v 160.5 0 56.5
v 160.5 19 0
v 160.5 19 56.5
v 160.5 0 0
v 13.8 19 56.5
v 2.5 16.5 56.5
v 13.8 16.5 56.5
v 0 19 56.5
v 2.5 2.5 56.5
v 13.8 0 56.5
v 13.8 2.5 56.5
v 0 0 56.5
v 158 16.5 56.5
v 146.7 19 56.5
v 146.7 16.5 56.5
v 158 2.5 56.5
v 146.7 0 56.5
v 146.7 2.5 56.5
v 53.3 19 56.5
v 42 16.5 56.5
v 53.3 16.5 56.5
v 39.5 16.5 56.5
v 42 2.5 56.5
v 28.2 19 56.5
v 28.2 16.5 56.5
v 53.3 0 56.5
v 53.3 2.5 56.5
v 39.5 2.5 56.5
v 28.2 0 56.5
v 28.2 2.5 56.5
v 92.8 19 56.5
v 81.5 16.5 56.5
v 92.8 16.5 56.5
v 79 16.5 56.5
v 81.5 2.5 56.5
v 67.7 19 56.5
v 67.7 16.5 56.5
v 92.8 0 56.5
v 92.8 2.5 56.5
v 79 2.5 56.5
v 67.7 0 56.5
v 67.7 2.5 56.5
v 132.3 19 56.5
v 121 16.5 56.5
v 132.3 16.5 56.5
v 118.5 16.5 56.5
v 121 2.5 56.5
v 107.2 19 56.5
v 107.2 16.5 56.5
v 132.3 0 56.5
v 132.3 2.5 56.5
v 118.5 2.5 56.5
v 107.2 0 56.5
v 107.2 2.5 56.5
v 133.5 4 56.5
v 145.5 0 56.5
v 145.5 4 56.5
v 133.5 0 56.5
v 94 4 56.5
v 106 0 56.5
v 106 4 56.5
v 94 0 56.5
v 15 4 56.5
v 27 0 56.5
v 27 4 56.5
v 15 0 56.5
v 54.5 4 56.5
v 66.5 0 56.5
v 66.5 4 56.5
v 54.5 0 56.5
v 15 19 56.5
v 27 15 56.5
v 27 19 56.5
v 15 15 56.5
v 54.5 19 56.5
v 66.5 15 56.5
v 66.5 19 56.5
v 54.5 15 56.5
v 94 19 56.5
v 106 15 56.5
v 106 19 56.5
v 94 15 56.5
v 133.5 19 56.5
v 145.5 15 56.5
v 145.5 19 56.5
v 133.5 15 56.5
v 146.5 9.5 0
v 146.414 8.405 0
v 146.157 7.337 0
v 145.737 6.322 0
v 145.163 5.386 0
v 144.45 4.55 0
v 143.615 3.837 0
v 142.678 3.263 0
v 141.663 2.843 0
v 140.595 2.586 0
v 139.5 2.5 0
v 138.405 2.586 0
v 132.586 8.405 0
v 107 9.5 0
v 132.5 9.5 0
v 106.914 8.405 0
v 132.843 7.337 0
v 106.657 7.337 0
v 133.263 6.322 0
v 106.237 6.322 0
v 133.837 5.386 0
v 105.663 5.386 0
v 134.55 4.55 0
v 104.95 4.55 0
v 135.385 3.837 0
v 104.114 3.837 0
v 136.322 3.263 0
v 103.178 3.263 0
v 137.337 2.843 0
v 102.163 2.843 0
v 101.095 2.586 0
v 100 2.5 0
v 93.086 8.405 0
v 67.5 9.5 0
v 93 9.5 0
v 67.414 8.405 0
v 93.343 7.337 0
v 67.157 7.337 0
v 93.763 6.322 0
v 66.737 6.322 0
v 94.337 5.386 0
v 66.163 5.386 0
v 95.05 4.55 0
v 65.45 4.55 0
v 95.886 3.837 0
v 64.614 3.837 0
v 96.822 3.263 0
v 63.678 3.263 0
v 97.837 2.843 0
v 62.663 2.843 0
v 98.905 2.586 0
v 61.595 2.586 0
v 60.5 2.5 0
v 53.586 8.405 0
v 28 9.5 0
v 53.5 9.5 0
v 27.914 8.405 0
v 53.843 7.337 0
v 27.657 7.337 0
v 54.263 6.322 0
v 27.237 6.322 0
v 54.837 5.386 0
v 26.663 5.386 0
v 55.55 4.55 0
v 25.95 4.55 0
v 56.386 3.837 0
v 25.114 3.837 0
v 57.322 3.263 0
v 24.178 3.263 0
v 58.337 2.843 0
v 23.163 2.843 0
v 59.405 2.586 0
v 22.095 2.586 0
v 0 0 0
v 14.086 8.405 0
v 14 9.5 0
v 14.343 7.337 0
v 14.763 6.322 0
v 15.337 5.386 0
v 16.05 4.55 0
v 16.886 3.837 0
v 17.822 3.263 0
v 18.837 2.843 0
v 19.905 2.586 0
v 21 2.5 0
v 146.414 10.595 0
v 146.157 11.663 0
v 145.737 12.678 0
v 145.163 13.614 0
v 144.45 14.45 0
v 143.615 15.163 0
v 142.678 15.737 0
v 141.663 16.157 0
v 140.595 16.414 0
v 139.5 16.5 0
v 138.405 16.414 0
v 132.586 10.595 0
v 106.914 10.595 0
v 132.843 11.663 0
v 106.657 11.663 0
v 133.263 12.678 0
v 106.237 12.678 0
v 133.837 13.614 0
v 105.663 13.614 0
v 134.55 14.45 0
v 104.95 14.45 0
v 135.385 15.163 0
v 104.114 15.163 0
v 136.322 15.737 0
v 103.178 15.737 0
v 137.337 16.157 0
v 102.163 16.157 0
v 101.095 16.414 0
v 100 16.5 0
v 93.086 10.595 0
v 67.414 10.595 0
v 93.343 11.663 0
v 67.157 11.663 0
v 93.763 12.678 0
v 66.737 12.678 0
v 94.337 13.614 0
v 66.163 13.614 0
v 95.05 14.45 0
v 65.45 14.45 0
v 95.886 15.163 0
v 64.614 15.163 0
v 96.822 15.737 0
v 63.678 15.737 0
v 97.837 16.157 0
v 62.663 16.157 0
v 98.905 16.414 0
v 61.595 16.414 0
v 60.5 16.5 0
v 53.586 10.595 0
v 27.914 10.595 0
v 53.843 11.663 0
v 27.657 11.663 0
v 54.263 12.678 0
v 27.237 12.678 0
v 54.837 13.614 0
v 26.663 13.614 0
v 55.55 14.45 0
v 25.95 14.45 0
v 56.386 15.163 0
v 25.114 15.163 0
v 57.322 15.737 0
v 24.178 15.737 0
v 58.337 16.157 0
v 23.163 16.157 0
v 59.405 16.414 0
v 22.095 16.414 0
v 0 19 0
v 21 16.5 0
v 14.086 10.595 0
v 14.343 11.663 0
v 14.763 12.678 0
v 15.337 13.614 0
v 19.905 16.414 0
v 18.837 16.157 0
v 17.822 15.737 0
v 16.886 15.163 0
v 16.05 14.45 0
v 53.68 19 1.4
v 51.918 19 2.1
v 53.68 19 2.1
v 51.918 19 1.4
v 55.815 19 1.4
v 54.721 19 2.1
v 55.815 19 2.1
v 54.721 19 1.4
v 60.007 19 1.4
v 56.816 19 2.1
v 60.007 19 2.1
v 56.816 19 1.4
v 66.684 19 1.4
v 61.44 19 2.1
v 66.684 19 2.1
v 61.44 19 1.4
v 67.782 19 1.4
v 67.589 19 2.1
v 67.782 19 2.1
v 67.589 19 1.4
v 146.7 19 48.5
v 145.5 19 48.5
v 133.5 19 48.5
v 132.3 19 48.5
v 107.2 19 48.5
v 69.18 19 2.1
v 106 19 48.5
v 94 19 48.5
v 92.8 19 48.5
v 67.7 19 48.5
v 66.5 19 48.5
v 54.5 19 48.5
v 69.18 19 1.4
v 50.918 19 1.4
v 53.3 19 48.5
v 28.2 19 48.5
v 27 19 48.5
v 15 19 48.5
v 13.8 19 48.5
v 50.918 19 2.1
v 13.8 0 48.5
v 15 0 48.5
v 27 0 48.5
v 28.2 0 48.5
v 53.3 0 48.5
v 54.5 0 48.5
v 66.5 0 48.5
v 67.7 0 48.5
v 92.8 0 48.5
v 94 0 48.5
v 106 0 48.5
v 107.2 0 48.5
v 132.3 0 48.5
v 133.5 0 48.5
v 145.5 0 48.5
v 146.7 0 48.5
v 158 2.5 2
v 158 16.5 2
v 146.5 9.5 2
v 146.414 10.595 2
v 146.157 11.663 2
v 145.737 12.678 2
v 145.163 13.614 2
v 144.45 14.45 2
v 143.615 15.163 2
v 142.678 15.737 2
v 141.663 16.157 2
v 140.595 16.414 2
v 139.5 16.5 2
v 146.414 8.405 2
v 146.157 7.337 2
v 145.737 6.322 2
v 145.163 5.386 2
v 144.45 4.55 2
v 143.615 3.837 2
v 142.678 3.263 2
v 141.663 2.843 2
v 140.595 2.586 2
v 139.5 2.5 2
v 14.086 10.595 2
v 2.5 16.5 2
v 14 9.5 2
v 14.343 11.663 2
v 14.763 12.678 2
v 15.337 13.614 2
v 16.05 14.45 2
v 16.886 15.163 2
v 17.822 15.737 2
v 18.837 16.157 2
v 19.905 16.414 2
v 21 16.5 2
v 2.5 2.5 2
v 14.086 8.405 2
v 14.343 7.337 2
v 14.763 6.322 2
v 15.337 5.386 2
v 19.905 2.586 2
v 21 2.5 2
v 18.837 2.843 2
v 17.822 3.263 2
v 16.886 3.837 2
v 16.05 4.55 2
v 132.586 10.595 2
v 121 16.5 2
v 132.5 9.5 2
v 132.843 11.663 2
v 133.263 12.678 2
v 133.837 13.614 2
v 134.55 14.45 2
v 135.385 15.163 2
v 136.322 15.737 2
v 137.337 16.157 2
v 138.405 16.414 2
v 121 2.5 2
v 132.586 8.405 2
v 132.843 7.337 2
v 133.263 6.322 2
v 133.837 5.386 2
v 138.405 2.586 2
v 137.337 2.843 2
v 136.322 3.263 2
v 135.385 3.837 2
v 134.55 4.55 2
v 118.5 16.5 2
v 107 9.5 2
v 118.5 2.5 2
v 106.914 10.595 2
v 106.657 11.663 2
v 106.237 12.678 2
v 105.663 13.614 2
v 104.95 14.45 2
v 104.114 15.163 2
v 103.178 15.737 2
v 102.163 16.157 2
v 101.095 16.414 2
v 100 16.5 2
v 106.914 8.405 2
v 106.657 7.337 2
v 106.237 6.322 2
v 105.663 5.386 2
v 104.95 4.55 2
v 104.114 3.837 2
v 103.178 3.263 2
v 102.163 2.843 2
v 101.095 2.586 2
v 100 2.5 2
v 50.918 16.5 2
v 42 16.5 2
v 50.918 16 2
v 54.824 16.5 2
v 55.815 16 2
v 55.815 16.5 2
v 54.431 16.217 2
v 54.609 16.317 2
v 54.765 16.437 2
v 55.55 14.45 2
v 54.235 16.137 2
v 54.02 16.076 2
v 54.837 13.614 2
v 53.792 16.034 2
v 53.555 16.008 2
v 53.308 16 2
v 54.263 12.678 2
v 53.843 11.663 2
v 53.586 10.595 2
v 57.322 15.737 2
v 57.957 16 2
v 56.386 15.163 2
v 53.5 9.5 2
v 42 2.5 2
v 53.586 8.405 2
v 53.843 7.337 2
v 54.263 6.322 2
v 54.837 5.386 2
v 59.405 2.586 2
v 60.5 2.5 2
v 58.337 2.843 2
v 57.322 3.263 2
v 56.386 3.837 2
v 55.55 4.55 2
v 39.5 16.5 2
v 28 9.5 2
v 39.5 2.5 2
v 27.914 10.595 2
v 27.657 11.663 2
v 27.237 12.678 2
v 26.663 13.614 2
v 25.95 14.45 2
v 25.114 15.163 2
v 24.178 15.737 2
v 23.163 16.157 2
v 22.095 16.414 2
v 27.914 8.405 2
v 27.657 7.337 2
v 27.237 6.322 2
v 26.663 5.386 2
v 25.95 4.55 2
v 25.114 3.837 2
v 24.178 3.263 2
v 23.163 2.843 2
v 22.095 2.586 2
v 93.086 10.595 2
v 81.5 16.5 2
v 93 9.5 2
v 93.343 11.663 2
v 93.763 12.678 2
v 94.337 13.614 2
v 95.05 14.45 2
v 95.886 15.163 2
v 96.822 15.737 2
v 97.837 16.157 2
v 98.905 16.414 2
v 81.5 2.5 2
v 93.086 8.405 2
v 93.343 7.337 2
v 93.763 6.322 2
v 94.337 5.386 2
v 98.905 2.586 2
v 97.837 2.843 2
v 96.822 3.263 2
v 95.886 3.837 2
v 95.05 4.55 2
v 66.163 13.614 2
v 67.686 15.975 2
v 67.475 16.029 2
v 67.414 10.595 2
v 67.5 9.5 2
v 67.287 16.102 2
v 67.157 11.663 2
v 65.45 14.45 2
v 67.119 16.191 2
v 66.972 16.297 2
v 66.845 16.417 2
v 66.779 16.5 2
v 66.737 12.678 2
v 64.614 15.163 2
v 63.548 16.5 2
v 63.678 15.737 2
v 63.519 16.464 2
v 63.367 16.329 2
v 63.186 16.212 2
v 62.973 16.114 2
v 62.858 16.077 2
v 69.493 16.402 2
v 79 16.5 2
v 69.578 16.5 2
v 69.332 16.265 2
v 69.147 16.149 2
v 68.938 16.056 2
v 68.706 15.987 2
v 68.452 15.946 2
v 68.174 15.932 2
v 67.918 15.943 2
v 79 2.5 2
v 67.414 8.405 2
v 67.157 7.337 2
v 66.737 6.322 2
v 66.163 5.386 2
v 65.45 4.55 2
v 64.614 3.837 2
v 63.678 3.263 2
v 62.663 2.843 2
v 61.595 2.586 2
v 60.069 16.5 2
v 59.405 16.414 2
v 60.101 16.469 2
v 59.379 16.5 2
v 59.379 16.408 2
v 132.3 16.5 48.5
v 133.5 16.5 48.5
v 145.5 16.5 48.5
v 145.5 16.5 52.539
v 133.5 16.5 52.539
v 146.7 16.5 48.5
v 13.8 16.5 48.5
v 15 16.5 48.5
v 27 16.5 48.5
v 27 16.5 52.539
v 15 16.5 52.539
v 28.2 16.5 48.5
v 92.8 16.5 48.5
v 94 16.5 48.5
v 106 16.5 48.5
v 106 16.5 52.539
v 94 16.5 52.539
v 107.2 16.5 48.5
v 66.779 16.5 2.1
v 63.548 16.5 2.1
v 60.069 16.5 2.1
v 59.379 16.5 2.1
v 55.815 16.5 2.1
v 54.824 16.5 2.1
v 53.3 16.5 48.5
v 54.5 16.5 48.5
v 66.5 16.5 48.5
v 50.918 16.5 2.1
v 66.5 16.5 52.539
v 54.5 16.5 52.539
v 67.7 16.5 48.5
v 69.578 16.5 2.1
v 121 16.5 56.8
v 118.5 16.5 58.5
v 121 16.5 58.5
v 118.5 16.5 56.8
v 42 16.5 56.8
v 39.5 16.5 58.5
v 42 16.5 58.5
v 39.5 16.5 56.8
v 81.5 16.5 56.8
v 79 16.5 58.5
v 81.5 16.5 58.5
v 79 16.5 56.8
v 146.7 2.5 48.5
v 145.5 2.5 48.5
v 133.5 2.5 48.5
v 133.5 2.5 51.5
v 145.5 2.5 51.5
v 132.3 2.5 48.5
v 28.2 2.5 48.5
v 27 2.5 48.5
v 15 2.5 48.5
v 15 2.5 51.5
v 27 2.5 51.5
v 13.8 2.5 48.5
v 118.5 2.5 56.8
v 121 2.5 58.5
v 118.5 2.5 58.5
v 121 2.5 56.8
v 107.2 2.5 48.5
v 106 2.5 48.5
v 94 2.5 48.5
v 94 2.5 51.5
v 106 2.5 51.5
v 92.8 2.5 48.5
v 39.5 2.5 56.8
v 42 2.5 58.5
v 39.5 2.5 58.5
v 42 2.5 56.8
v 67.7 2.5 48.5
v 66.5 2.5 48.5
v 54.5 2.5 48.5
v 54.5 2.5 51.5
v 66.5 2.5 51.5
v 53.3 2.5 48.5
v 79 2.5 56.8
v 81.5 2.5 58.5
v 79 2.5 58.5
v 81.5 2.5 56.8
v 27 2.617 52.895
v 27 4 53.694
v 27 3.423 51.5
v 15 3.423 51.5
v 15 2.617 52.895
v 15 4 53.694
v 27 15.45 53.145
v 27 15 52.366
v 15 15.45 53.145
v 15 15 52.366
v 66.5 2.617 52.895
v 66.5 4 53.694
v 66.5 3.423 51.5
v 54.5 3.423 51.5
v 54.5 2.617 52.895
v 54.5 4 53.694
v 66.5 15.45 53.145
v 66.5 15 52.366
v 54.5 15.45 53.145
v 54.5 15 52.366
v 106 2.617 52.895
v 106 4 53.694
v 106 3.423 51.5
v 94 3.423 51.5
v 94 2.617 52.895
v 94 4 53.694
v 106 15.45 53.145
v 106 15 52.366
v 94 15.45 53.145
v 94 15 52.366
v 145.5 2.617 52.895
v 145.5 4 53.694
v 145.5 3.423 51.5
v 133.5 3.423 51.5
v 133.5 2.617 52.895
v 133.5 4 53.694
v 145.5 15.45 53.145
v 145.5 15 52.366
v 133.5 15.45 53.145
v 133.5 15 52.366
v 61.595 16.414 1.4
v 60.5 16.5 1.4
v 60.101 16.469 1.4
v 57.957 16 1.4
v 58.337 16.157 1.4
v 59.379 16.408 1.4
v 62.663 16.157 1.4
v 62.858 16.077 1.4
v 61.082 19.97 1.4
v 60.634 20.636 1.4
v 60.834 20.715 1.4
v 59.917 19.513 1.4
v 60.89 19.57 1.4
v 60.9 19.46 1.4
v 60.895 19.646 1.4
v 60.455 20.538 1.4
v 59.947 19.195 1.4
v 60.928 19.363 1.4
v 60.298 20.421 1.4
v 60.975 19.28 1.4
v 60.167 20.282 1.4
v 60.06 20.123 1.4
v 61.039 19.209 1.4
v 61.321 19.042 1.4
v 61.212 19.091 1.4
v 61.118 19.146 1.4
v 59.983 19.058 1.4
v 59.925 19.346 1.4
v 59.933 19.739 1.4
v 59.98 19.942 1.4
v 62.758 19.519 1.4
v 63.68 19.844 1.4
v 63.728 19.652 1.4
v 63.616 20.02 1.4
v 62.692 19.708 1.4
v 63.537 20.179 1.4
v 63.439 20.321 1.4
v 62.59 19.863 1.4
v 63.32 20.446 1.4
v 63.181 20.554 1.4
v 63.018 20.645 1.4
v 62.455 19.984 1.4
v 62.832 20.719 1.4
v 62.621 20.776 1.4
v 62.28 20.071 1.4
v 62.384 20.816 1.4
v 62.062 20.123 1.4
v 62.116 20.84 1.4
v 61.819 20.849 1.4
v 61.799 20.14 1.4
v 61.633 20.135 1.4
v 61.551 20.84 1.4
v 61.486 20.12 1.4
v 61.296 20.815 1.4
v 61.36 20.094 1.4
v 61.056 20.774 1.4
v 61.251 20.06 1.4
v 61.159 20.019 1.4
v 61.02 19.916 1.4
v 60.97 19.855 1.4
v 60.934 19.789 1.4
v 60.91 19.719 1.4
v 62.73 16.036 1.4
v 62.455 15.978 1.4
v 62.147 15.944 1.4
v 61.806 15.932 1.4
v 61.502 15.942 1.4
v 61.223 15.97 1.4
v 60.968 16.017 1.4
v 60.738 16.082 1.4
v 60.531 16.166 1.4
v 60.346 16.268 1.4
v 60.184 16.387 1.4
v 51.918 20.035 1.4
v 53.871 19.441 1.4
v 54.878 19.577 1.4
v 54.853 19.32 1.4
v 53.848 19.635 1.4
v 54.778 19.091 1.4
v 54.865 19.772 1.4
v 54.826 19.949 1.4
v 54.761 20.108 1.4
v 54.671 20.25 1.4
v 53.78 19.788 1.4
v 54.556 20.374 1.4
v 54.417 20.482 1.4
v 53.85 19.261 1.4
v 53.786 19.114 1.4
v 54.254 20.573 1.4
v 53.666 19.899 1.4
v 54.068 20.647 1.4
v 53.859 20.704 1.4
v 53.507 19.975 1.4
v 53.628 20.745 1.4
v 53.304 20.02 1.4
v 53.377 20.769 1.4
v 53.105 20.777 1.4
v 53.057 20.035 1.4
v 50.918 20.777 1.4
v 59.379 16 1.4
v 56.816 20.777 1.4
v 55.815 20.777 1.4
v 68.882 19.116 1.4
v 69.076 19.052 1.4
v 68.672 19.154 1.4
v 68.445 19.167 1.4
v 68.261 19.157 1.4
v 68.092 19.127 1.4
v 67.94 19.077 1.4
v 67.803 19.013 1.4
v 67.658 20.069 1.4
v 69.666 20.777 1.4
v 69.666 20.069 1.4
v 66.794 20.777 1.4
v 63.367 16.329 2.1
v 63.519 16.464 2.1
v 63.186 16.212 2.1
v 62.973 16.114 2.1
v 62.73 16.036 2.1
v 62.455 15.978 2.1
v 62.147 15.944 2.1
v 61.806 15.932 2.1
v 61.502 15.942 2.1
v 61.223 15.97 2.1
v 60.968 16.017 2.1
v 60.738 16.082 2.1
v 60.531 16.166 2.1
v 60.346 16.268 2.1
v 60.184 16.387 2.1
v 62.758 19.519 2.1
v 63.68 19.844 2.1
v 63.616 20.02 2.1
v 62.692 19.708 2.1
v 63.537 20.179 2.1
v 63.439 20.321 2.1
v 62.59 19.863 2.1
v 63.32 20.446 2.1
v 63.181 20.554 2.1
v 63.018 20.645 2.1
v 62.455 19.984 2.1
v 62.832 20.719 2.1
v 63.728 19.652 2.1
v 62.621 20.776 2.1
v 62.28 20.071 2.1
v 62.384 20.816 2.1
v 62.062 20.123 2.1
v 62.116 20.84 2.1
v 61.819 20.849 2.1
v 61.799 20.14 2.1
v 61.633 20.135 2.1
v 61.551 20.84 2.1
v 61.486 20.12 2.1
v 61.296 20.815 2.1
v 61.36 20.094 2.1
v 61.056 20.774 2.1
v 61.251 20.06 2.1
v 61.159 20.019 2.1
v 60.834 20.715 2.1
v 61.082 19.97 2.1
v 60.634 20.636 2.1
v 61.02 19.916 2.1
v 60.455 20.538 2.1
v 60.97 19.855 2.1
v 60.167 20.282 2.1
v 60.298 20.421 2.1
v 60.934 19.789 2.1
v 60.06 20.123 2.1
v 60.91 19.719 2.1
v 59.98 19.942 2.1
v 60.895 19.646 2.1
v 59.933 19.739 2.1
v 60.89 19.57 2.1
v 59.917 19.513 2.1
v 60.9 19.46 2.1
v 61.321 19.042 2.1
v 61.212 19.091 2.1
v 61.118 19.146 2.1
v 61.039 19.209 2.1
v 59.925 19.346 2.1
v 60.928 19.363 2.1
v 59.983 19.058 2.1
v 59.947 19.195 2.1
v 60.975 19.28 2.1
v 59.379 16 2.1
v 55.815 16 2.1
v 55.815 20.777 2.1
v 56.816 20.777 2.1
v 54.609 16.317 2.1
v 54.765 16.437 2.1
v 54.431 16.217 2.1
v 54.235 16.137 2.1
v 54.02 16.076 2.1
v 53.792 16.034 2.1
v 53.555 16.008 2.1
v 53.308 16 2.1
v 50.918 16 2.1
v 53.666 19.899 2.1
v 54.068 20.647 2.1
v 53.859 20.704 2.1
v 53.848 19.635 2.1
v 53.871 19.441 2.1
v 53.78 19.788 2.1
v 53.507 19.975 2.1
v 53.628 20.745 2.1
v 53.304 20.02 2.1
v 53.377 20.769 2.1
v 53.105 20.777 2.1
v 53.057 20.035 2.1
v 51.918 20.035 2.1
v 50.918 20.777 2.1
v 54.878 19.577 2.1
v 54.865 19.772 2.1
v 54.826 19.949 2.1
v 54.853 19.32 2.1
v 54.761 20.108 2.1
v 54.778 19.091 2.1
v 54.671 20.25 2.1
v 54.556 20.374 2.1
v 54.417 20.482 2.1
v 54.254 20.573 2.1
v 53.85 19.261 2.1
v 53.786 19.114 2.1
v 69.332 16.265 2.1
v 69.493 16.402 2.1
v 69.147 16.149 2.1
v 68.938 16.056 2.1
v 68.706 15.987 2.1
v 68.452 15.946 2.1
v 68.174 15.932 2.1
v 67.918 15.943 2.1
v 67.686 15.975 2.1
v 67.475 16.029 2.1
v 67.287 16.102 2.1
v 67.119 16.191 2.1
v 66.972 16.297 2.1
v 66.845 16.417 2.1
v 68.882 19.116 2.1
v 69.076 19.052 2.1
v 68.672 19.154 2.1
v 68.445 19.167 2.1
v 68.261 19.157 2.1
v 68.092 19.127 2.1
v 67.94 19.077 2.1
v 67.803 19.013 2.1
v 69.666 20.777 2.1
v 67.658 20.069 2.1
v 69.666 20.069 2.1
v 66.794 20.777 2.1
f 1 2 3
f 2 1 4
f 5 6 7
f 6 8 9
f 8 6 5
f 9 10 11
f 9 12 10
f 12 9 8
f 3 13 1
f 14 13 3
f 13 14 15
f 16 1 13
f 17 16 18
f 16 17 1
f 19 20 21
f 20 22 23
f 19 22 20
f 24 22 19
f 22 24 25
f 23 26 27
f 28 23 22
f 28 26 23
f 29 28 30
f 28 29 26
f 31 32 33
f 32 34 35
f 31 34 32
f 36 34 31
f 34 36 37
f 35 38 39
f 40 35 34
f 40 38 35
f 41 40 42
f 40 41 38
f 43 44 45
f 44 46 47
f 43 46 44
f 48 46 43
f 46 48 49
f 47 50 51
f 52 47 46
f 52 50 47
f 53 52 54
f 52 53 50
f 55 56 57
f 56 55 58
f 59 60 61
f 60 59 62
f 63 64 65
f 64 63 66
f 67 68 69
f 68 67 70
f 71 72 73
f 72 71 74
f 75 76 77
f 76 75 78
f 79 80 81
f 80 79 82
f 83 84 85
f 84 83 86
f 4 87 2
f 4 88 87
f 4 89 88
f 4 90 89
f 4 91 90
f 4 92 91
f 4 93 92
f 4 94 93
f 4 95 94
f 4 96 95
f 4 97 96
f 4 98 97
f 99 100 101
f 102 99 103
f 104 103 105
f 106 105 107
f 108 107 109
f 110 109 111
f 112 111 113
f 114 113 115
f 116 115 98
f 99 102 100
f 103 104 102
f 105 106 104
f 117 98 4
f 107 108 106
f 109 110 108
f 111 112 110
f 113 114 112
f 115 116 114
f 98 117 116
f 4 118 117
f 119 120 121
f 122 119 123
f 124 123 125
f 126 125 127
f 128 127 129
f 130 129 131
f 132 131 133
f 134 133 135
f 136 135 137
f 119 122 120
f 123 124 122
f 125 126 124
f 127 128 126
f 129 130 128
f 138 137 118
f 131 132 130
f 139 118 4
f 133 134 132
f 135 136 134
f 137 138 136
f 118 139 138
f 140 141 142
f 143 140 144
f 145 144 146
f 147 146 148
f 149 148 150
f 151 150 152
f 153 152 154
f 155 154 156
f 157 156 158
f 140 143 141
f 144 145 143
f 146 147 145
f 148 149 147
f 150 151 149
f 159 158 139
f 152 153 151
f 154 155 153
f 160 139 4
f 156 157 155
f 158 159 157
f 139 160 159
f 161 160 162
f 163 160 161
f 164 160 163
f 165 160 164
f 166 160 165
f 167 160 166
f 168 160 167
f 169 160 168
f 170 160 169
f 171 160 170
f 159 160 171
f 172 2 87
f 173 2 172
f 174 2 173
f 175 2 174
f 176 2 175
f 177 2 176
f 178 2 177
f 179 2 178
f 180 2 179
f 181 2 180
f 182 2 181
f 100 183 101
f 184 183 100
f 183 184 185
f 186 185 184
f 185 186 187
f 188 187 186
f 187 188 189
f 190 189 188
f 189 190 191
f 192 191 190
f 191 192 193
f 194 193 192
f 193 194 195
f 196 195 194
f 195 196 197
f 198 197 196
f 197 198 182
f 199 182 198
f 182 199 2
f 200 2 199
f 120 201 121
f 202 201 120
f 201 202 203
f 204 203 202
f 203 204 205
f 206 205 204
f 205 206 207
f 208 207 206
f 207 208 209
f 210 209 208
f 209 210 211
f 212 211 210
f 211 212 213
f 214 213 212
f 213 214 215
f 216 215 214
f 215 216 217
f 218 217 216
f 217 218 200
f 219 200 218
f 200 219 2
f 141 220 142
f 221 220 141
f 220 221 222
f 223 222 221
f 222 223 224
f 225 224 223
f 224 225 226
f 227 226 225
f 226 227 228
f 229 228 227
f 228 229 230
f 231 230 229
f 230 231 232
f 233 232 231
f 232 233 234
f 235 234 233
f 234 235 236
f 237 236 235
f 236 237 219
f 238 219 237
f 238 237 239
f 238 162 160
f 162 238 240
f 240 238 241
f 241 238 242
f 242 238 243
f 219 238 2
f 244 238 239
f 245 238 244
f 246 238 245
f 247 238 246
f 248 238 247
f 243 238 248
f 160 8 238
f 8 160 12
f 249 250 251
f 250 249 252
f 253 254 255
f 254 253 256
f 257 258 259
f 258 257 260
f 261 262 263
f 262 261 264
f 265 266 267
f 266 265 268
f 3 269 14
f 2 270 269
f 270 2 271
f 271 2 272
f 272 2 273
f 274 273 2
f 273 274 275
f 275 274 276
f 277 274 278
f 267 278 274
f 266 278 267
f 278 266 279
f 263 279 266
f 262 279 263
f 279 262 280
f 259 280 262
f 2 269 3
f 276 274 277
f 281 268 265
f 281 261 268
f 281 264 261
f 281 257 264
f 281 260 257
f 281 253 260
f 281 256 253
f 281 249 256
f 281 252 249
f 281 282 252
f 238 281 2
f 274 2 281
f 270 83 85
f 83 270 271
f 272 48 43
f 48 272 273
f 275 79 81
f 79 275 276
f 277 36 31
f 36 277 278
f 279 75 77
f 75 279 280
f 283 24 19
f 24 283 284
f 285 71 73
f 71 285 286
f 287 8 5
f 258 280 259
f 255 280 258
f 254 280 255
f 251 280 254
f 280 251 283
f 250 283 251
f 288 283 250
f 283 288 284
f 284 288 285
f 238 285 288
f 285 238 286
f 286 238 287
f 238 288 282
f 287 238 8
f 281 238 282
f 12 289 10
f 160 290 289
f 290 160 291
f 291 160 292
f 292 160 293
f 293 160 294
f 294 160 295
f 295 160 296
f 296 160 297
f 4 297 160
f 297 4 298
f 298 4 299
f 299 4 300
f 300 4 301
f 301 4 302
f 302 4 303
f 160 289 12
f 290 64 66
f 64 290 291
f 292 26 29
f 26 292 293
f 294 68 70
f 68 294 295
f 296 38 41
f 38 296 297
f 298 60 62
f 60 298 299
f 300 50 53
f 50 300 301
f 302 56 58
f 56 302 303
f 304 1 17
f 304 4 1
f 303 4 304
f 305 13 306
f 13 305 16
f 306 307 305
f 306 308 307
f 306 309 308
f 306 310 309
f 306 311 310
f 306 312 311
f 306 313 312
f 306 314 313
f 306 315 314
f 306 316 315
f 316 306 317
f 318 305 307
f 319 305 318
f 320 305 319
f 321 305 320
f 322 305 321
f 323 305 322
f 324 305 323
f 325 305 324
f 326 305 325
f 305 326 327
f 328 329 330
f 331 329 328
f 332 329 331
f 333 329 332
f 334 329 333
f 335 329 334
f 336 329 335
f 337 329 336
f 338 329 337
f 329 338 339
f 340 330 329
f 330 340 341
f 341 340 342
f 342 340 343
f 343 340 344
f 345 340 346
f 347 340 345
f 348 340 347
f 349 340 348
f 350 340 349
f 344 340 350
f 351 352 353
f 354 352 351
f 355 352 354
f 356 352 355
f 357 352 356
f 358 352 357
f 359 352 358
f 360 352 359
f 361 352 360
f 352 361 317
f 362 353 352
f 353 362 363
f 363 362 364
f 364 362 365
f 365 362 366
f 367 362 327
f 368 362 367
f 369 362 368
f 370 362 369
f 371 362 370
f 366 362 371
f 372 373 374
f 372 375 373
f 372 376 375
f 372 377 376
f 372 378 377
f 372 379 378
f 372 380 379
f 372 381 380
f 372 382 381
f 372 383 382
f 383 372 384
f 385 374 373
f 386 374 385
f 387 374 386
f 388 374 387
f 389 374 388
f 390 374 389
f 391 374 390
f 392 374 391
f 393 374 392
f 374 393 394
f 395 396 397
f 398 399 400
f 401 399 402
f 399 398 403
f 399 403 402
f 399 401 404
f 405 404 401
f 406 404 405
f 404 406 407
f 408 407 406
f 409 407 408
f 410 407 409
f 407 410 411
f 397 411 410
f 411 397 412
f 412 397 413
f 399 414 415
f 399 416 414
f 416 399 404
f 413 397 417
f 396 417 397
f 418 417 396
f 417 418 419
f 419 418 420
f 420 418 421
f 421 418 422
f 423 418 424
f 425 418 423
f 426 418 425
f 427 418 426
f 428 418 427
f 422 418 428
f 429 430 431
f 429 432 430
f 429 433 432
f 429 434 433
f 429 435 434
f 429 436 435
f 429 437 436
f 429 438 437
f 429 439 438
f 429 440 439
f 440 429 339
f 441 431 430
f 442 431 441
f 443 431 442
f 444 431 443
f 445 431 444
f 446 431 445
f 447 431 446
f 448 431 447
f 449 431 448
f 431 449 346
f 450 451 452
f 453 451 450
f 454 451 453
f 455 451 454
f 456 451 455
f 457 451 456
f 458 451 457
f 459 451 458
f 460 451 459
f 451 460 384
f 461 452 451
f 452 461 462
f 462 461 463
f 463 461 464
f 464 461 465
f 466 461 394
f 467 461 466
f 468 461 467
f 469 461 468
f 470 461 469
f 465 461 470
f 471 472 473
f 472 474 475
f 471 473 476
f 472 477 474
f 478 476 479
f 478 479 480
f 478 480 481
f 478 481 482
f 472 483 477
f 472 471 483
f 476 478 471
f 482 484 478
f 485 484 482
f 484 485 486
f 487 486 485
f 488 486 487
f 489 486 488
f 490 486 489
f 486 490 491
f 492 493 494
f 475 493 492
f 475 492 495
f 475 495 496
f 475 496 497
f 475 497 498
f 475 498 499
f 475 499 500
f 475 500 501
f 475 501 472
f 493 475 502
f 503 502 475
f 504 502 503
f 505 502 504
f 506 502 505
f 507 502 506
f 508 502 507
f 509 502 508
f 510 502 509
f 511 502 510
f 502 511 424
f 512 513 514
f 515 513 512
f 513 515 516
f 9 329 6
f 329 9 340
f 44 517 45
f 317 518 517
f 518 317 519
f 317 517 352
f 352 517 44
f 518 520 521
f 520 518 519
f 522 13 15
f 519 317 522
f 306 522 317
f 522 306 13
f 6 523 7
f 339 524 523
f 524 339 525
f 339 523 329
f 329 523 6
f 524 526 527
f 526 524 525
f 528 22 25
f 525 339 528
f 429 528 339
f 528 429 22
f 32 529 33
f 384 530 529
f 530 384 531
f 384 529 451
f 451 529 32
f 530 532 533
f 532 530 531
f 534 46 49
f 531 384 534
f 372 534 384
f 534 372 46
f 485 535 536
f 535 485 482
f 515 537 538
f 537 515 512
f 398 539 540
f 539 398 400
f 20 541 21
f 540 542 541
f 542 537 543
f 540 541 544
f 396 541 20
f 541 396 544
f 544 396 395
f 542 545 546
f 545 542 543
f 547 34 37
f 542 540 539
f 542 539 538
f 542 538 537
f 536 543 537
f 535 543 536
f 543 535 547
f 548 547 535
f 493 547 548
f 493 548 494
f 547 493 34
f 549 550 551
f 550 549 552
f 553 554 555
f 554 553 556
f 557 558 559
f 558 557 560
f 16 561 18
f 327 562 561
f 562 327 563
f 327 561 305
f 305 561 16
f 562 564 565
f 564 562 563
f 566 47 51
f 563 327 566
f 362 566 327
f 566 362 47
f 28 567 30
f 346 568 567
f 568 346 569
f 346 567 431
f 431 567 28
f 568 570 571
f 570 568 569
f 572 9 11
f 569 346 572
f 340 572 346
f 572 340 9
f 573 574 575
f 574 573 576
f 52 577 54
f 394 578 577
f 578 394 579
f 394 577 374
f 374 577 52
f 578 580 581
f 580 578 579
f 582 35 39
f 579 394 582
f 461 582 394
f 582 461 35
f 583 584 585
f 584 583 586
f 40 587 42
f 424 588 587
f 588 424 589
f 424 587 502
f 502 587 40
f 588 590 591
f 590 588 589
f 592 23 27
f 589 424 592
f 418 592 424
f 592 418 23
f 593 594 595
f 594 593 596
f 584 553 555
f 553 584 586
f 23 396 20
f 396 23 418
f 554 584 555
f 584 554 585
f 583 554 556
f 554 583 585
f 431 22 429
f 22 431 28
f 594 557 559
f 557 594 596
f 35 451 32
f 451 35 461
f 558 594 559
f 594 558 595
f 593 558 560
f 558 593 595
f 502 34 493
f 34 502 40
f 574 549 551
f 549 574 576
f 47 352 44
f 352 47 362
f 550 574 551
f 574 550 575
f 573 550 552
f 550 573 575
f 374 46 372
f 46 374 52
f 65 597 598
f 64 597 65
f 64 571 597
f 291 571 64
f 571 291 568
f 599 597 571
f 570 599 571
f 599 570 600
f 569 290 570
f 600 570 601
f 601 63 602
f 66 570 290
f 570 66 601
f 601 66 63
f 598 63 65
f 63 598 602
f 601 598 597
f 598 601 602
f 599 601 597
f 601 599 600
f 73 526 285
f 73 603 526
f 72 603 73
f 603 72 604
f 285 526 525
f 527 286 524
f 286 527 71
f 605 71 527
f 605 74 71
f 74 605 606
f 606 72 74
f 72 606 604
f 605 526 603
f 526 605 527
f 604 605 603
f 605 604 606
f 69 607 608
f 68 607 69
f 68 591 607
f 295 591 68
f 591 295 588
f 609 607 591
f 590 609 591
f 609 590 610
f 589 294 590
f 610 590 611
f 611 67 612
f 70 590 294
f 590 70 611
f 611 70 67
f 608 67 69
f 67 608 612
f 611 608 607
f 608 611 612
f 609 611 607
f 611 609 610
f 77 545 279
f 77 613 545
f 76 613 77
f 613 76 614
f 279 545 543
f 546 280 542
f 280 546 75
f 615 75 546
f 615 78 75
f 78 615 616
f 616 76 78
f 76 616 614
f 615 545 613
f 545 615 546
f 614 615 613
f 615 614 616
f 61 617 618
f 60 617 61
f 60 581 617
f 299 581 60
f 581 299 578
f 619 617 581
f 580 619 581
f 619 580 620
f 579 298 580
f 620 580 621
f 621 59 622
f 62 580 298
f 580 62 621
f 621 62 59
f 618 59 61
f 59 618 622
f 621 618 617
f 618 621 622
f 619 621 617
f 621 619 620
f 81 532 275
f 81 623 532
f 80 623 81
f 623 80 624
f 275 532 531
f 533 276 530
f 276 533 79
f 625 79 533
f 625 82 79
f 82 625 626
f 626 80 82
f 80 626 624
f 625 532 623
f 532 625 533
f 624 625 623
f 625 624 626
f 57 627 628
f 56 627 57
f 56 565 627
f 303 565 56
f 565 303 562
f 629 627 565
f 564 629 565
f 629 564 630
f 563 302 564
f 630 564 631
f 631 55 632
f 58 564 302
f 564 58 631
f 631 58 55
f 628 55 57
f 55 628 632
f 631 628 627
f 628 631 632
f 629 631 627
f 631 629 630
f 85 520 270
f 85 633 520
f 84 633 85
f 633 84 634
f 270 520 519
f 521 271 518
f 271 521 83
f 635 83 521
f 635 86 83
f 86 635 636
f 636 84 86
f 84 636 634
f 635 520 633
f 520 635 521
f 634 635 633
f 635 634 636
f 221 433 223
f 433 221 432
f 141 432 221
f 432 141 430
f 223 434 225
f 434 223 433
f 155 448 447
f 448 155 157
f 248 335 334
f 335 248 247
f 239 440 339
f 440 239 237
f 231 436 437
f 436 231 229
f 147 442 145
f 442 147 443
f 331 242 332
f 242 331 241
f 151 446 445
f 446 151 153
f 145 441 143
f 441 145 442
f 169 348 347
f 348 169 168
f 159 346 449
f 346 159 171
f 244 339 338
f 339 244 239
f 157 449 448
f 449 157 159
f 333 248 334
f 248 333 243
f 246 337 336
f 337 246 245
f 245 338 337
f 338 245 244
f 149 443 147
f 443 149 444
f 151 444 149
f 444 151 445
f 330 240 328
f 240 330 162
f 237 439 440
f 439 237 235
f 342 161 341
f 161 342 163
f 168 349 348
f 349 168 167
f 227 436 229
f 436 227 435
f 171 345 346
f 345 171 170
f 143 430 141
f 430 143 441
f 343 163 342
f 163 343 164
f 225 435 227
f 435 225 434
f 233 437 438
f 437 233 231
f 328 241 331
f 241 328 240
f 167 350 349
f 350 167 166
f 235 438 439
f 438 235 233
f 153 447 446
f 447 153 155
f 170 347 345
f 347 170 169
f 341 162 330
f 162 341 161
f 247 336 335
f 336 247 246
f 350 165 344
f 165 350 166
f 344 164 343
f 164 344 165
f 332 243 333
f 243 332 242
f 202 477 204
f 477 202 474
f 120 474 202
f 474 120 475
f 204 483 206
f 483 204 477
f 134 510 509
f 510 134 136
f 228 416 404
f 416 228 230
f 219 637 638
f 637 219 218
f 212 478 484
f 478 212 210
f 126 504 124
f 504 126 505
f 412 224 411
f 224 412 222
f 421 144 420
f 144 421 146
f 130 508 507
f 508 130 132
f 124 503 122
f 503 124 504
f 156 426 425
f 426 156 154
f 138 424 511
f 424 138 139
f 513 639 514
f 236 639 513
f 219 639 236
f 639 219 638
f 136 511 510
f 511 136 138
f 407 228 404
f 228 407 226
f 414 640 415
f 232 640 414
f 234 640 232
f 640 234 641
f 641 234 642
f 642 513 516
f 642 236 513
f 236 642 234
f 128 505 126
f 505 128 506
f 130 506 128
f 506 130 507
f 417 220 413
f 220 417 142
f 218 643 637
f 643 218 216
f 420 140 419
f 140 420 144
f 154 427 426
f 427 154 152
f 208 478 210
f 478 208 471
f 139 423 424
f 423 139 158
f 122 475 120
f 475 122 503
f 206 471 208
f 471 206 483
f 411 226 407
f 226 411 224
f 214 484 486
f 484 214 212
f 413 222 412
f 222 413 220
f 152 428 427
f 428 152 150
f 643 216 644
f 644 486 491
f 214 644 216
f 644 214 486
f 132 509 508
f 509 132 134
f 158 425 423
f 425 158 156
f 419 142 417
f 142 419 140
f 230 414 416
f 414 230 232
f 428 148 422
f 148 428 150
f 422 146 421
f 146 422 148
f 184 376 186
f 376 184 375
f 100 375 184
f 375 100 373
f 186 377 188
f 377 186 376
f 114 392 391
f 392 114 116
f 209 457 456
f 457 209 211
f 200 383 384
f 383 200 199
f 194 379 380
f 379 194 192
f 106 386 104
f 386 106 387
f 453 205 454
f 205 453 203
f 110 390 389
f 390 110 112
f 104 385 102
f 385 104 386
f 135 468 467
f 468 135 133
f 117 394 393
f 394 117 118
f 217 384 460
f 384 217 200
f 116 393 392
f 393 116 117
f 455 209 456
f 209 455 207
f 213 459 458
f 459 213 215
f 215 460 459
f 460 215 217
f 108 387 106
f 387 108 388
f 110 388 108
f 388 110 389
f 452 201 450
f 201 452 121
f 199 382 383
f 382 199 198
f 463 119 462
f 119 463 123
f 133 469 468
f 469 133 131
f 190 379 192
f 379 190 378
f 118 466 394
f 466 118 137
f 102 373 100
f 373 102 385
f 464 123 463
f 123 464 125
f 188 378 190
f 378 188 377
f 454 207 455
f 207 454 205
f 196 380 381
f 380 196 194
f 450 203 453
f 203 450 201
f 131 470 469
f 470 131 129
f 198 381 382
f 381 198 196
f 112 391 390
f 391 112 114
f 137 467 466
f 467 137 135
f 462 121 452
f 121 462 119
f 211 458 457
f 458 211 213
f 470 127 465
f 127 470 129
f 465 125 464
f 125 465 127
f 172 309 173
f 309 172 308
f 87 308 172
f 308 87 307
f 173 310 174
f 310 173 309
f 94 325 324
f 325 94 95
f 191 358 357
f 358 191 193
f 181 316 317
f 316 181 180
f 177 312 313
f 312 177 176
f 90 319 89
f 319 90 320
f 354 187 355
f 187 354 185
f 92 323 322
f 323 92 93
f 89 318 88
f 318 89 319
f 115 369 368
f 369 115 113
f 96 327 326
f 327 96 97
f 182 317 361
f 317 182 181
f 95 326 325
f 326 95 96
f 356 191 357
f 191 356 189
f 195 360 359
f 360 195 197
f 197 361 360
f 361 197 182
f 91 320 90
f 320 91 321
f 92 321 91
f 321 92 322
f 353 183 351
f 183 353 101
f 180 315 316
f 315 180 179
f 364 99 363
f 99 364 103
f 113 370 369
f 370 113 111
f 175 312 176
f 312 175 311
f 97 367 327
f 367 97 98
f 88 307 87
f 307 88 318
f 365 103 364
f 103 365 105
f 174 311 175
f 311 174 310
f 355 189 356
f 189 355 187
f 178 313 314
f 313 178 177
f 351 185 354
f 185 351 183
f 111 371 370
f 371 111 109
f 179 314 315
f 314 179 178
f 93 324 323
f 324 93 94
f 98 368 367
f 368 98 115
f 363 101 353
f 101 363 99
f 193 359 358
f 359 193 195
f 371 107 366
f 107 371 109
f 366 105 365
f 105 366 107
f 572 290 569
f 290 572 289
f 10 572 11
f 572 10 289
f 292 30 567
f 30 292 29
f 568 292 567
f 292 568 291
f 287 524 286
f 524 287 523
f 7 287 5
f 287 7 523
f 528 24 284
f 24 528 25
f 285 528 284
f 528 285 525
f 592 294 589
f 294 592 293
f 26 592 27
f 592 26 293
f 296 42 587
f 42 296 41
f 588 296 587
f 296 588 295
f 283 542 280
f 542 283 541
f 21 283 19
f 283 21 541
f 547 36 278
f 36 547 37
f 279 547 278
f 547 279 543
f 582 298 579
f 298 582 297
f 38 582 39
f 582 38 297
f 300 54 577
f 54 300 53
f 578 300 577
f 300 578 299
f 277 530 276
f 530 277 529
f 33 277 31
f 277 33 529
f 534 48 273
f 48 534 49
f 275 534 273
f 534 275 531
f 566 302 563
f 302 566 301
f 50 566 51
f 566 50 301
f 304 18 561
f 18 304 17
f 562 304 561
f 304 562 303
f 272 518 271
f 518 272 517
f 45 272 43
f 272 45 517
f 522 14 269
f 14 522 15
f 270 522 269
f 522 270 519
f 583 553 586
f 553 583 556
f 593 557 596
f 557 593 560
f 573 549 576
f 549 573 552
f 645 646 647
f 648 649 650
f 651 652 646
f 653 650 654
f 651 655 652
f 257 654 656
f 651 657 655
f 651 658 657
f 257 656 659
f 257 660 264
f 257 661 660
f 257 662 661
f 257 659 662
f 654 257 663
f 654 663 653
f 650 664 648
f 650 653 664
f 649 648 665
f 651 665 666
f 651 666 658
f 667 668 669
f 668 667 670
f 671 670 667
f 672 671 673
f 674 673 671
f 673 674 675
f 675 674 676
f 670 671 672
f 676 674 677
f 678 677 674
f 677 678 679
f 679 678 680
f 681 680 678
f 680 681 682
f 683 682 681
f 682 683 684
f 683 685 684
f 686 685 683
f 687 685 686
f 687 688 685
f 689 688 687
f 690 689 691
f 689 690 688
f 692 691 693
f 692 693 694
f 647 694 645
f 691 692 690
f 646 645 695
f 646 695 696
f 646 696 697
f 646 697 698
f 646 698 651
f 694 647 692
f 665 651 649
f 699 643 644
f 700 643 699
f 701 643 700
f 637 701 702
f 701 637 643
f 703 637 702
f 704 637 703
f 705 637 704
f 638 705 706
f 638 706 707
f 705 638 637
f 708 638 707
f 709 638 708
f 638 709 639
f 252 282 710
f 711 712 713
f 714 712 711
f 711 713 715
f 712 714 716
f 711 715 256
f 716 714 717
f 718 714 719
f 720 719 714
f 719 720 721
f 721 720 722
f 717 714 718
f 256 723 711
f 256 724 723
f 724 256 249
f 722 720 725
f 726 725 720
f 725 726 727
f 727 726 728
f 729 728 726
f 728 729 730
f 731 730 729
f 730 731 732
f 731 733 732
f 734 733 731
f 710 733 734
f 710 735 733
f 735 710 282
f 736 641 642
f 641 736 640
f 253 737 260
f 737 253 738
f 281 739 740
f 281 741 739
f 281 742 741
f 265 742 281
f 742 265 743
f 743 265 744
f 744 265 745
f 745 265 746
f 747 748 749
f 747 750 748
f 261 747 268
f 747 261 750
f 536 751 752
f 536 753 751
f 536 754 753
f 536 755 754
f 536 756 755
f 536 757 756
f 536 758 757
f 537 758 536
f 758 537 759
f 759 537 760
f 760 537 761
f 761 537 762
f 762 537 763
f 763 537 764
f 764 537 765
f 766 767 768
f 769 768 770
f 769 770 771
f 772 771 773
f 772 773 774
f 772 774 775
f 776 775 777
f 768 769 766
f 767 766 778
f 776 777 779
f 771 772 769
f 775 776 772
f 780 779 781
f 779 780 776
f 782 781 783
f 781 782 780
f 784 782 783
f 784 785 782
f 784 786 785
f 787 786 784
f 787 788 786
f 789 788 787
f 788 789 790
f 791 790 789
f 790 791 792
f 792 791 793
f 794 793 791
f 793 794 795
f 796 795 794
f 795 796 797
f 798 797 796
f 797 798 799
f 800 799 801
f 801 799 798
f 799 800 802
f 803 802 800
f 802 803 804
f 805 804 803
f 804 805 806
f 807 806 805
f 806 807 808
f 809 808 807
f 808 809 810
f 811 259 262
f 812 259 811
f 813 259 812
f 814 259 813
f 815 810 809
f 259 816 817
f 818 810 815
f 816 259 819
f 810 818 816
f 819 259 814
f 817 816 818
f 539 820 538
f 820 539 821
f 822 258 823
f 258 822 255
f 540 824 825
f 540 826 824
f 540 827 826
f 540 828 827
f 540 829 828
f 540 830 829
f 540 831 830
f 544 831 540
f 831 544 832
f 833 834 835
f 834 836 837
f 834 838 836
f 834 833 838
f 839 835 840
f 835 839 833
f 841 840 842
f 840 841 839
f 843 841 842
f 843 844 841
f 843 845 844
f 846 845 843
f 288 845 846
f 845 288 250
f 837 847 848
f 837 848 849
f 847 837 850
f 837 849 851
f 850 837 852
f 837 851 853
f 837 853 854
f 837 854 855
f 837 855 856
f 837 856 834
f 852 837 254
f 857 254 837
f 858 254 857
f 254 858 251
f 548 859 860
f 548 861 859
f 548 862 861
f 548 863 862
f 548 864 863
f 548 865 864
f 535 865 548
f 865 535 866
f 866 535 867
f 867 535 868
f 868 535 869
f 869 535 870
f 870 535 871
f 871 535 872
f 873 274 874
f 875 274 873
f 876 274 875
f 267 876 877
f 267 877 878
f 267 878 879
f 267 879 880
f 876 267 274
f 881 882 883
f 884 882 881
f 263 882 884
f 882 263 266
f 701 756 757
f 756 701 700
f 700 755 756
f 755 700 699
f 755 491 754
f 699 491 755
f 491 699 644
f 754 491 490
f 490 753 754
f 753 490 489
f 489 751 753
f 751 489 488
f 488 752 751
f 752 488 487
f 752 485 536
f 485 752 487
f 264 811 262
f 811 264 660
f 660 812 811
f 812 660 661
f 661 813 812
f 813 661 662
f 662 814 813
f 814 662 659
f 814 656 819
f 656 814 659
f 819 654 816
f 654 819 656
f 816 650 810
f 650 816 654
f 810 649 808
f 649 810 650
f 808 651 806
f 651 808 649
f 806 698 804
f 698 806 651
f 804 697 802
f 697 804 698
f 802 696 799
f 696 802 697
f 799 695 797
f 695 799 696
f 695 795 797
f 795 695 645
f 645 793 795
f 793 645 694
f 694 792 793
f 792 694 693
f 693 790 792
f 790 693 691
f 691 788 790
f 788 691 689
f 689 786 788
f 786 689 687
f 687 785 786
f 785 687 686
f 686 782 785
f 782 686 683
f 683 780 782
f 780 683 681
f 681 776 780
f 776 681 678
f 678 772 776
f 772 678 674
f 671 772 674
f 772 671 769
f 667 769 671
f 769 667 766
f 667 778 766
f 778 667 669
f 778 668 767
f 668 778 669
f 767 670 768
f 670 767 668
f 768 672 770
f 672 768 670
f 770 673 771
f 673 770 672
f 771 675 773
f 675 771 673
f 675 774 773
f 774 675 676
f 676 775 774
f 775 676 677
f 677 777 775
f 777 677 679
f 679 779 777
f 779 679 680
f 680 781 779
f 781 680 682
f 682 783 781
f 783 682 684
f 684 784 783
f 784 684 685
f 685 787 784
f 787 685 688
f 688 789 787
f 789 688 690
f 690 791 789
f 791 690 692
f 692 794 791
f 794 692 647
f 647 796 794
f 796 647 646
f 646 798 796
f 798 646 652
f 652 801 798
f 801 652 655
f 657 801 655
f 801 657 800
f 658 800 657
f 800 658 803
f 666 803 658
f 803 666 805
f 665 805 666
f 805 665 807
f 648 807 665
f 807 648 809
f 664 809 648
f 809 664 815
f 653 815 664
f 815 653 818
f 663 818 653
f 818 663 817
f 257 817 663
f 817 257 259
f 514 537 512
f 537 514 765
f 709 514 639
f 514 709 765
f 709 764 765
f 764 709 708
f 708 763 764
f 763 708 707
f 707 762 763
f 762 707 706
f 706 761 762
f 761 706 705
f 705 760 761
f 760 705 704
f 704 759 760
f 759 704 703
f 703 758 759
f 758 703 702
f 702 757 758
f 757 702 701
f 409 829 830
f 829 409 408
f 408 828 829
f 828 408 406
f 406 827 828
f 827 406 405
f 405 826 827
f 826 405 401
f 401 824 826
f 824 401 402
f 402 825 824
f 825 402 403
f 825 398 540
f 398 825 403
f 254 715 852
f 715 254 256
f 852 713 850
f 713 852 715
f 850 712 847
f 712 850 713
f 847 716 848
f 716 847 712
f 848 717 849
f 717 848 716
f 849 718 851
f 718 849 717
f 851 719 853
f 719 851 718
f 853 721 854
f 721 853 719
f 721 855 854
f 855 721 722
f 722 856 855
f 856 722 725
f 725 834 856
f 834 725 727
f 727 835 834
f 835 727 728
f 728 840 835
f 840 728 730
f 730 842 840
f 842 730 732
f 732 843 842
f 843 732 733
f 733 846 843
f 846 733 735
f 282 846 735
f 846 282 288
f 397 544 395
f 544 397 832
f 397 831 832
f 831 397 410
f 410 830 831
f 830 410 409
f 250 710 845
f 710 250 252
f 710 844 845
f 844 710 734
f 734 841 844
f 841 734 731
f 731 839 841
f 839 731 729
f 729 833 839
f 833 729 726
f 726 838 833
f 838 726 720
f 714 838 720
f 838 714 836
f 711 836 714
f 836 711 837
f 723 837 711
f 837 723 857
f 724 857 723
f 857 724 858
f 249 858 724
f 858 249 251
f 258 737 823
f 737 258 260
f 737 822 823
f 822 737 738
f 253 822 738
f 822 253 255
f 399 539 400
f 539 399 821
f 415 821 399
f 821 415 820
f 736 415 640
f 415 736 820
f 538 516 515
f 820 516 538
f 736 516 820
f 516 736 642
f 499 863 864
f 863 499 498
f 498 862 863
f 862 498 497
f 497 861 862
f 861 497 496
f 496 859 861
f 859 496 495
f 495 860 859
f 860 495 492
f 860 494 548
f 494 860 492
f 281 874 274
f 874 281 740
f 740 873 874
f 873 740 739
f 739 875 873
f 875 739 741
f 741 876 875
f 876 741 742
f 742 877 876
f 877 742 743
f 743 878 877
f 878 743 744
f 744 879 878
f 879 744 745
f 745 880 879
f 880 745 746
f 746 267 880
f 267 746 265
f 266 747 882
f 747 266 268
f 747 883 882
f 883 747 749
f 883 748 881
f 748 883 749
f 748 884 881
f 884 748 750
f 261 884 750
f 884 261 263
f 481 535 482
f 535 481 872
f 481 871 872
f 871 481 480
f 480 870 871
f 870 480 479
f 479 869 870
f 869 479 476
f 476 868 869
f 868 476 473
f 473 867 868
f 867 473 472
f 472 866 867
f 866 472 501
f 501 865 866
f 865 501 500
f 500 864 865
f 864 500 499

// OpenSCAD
// Battery Case for 4x Olympus BLS-5 Batteries
// Battery dimensions: 56mm x 36mm x 13mm
// Arrangement: 4x1 linear, standing upright on 36x13mm face

// Parameters
battery_length = 56;  // tallest dimension (vertical when upright)
battery_width = 36;   // medium dimension
battery_depth = 13;   // smallest dimension (base when upright)

wall_thickness = 2.5;
base_thickness = 2;
clearance = 0.5;  // clearance around battery for easy fit

// Snap-fit parameters
snap_overhang = 1.5;  // how far the snap protrudes inward
snap_height = 5;      // height of snap from top of battery
snap_width = 12;      // width of each snap tab
snap_flex_gap = 1.2;  // gap to allow flexibility

// Finger hole parameters
finger_hole_diameter = 14;

num_batteries = 4;

// Calculated dimensions
slot_width = battery_width + 2 * clearance;
slot_depth = battery_depth + 2 * clearance;
slot_height = battery_length + clearance;

inner_width = slot_width * num_batteries + wall_thickness * (num_batteries - 1);
outer_width = inner_width + 2 * wall_thickness;
outer_depth = slot_depth + 2 * wall_thickness;
outer_height = slot_height + snap_height;

module complete_case() {
    difference() {
        union() {
            // Main base and walls
            cube([outer_width, outer_depth, base_thickness]);
            
            // Outer walls
            difference() {
                cube([outer_width, outer_depth, slot_height]);
                translate([wall_thickness, wall_thickness, base_thickness])
                    cube([inner_width, slot_depth, slot_height]);
            }
            
            // Interior dividing walls
            for (i = [1:num_batteries-1]) {
                translate([wall_thickness + i * (slot_width + wall_thickness) - wall_thickness, 
                          wall_thickness, base_thickness])
                    cube([wall_thickness, slot_depth, slot_height]);
            }
            
            // Snap-fit tabs at the top
            for (i = [0:num_batteries-1]) {
                x_offset = wall_thickness + i * (slot_width + wall_thickness);
                
                // Front snap tab
                translate([x_offset + slot_width/2 - snap_width/2, 
                          0, 
                          slot_height - snap_height])
                    difference() {
                        cube([snap_width, wall_thickness + snap_overhang, snap_height]);
                        // Chamfer for easy insertion (angled entry)
                        translate([0, wall_thickness + snap_overhang, 0])
                            rotate([30, 0, 0])
                                translate([-0.1, -0.5, -0.1])
                                    cube([snap_width + 0.2, 2, 2]);
                    }
                
                // Back snap tab
                translate([x_offset + slot_width/2 - snap_width/2, 
                          outer_depth - wall_thickness - snap_overhang, 
                          slot_height - snap_height])
                    difference() {
                        cube([snap_width, wall_thickness + snap_overhang, snap_height]);
                        // Chamfer for easy insertion (angled entry)
                        translate([0, -0.5, 0])
                            rotate([-30, 0, 0])
                                translate([-0.1, 0, -0.1])
                                    cube([snap_width + 0.2, 2, 2]);
                    }
            }
        }
        
        // Finger holes from bottom
        for (i = [0:num_batteries-1]) {
            translate([wall_thickness + i * (slot_width + wall_thickness) + slot_width/2, 
                      wall_thickness + slot_depth/2, 
                      -0.1])
                cylinder(d=finger_hole_diameter, h=base_thickness + 0.2, $fn=40);
        }
        
        // Flexibility cuts for snap tabs
        for (i = [0:num_batteries-1]) {
            x_offset = wall_thickness + i * (slot_width + wall_thickness);
            
            // Front flexibility cuts (left side)
            translate([x_offset + slot_width/2 - snap_width/2 - snap_flex_gap, 
                      -0.1, 
                      slot_height - snap_height - 3])
                cube([snap_flex_gap, wall_thickness + snap_overhang + 0.2, snap_height + 3.1]);
                
            // Front flexibility cuts (right side)
            translate([x_offset + slot_width/2 + snap_width/2, 
                      -0.1, 
                      slot_height - snap_height - 3])
                cube([snap_flex_gap, wall_thickness + snap_overhang + 0.2, snap_height + 3.1]);
            
            // Back flexibility cuts (left side)
            translate([x_offset + slot_width/2 - snap_width/2 - snap_flex_gap, 
                      outer_depth - wall_thickness - snap_overhang - 0.1, 
                      slot_height - snap_height - 3])
                cube([snap_flex_gap, wall_thickness + snap_overhang + 0.2, snap_height + 3.1]);
                
            // Back flexibility cuts (right side)
            translate([x_offset + slot_width/2 + snap_width/2, 
                      outer_depth - wall_thickness - snap_overhang - 0.1, 
                      slot_height - snap_height - 3])
                cube([snap_flex_gap, wall_thickness + snap_overhang + 0.2, snap_height + 3.1]);
        }
        
        // Add small chamfer to top edges for better printability
        translate([-0.1, -0.1, slot_height])
            rotate([0, 0, 0])
                cube([outer_width + 0.2, outer_depth + 0.2, 0.3]);
    }
    
    // Add text label (optional)
    translate([outer_width/2 - 20, outer_depth - wall_thickness - 0.5, base_thickness - 0.6])
        linear_extrude(0.7)
            text("BLS-5", size=5, halign="center", font="Liberation Sans:style=Bold");
}

complete_case();
